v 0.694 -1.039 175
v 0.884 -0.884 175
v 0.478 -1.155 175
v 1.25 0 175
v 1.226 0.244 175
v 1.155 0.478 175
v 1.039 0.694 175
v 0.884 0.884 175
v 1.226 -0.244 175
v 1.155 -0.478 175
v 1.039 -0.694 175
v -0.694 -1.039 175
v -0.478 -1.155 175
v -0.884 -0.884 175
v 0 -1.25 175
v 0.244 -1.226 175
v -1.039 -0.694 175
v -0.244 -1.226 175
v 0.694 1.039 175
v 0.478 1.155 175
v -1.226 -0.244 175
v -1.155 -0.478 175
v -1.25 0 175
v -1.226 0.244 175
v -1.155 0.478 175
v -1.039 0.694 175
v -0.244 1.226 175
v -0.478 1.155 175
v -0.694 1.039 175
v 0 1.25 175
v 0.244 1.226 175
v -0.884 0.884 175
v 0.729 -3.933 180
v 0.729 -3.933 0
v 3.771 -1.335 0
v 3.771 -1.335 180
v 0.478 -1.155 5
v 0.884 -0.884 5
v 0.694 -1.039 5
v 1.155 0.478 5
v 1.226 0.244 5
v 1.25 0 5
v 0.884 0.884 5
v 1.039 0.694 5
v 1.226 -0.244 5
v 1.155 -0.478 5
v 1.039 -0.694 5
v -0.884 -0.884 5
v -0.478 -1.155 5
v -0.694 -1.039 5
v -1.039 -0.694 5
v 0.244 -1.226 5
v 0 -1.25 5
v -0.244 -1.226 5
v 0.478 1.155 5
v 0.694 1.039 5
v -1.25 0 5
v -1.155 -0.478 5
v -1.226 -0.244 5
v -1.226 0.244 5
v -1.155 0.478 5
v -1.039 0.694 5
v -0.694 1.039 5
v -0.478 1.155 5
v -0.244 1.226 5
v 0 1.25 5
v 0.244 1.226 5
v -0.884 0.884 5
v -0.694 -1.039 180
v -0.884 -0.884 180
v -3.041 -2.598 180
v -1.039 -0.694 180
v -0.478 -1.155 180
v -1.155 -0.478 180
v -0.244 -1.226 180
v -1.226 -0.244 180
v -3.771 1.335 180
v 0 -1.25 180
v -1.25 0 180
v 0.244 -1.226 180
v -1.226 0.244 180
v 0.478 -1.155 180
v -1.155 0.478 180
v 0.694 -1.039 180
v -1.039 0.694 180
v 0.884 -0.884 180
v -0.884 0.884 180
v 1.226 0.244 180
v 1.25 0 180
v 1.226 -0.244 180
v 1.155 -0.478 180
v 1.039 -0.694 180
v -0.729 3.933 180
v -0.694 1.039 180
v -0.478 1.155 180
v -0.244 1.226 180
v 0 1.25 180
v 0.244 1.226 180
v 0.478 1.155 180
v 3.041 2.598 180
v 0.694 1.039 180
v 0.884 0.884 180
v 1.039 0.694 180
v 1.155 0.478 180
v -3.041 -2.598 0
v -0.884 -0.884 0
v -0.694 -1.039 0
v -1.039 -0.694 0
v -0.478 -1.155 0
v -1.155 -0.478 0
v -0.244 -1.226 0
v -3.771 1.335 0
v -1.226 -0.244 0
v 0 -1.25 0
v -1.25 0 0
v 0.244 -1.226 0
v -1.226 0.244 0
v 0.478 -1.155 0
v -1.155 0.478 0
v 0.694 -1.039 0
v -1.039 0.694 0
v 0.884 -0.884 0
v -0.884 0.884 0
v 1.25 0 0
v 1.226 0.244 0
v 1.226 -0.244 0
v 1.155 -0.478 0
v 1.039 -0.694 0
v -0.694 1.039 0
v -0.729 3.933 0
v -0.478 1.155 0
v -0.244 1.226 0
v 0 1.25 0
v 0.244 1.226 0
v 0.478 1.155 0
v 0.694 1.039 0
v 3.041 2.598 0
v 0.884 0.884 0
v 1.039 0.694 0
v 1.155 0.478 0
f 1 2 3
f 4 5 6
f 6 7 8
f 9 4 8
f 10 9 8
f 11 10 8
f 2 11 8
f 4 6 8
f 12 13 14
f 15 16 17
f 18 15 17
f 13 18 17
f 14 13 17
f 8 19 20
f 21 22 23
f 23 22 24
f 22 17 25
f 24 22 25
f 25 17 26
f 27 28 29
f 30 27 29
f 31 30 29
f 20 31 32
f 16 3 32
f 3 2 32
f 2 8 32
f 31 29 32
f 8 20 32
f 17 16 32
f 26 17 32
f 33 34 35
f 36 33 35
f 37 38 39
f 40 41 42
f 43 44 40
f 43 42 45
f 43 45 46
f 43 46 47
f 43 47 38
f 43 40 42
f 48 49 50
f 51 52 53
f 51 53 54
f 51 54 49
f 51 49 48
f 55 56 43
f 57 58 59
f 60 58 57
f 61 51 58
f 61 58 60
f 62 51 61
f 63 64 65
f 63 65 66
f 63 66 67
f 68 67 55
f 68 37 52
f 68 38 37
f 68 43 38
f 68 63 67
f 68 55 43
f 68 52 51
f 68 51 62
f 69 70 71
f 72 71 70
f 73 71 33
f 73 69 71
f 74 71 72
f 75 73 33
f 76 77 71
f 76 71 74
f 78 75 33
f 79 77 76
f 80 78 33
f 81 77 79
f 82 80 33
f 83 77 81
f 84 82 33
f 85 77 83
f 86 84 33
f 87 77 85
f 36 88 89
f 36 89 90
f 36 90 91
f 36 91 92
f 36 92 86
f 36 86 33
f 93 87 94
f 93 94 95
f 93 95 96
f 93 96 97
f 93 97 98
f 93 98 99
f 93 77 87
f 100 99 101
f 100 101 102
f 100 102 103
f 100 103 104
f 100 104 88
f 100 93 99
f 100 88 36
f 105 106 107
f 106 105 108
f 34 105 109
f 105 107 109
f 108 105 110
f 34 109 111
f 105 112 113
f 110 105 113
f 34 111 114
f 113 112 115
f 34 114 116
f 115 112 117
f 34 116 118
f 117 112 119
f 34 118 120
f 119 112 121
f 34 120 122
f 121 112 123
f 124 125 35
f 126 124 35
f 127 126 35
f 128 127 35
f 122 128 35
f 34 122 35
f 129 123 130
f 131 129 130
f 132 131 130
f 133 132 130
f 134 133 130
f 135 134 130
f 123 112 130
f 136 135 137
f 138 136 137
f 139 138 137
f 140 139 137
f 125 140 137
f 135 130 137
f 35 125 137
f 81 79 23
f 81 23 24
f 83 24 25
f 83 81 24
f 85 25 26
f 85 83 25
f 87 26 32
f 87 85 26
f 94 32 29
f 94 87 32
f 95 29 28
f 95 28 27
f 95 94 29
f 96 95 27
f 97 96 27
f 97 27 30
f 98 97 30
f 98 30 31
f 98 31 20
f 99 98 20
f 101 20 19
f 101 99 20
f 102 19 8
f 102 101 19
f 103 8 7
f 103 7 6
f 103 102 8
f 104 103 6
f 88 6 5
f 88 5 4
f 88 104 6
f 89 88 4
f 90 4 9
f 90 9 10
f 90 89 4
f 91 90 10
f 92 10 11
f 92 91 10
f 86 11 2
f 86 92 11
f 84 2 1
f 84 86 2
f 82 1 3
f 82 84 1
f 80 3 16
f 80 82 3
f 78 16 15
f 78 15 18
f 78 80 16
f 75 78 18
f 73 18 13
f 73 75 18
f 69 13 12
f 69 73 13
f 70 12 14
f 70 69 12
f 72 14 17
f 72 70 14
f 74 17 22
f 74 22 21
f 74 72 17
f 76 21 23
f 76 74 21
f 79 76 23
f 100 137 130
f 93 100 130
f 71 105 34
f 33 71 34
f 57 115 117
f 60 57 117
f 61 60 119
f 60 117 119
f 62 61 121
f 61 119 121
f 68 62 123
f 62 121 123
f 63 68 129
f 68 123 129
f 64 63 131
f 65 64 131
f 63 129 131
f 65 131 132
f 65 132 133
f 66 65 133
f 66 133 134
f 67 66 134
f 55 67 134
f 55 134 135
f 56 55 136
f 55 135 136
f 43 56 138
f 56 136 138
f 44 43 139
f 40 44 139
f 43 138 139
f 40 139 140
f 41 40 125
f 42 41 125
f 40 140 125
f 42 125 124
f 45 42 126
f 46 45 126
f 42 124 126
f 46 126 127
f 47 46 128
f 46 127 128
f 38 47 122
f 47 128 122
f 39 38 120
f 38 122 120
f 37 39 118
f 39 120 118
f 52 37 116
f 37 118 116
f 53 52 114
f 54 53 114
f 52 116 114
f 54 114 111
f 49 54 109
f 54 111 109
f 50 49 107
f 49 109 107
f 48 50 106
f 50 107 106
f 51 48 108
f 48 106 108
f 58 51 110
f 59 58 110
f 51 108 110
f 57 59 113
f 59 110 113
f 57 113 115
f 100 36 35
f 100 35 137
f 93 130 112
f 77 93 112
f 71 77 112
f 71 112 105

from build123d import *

# Parameters (mm, degrees)
BOSS_EXTRUDE1_DEPTH = 180
SKETCH4_R           = 1.25
CUT_EXTRUDE1_DEPTH  = 5


with BuildPart() as part:
    # Sketch1 → Boss-Extrude1 (new body)
    with BuildSketch(Plane.XY):
        Polygon((3.770690633, -1.334875333), (3.041381265, 2.598076211), (-0.729309367, 3.932951544), (-3.770690633, 1.334875333), (-3.041381265, -2.598076211), (0.729309367, -3.932951544), align=None)
    extrude(amount=BOSS_EXTRUDE1_DEPTH)

    # Sketch4 → Cut-Extrude1 (cut)
    with BuildSketch(Plane(origin=(0, 0, 0), x_dir=(-1, 0, 0), z_dir=(0, 0, -1))):
        Circle(SKETCH4_R)
    cut_extrude1 = extrude(amount=-CUT_EXTRUDE1_DEPTH, mode=Mode.SUBTRACT)

    # Mirror1: Cut-Extrude1 across plane
    add(cut_extrude1.mirror(Plane.XY.offset(90)), mode=Mode.SUBTRACT)


solid = part.part
